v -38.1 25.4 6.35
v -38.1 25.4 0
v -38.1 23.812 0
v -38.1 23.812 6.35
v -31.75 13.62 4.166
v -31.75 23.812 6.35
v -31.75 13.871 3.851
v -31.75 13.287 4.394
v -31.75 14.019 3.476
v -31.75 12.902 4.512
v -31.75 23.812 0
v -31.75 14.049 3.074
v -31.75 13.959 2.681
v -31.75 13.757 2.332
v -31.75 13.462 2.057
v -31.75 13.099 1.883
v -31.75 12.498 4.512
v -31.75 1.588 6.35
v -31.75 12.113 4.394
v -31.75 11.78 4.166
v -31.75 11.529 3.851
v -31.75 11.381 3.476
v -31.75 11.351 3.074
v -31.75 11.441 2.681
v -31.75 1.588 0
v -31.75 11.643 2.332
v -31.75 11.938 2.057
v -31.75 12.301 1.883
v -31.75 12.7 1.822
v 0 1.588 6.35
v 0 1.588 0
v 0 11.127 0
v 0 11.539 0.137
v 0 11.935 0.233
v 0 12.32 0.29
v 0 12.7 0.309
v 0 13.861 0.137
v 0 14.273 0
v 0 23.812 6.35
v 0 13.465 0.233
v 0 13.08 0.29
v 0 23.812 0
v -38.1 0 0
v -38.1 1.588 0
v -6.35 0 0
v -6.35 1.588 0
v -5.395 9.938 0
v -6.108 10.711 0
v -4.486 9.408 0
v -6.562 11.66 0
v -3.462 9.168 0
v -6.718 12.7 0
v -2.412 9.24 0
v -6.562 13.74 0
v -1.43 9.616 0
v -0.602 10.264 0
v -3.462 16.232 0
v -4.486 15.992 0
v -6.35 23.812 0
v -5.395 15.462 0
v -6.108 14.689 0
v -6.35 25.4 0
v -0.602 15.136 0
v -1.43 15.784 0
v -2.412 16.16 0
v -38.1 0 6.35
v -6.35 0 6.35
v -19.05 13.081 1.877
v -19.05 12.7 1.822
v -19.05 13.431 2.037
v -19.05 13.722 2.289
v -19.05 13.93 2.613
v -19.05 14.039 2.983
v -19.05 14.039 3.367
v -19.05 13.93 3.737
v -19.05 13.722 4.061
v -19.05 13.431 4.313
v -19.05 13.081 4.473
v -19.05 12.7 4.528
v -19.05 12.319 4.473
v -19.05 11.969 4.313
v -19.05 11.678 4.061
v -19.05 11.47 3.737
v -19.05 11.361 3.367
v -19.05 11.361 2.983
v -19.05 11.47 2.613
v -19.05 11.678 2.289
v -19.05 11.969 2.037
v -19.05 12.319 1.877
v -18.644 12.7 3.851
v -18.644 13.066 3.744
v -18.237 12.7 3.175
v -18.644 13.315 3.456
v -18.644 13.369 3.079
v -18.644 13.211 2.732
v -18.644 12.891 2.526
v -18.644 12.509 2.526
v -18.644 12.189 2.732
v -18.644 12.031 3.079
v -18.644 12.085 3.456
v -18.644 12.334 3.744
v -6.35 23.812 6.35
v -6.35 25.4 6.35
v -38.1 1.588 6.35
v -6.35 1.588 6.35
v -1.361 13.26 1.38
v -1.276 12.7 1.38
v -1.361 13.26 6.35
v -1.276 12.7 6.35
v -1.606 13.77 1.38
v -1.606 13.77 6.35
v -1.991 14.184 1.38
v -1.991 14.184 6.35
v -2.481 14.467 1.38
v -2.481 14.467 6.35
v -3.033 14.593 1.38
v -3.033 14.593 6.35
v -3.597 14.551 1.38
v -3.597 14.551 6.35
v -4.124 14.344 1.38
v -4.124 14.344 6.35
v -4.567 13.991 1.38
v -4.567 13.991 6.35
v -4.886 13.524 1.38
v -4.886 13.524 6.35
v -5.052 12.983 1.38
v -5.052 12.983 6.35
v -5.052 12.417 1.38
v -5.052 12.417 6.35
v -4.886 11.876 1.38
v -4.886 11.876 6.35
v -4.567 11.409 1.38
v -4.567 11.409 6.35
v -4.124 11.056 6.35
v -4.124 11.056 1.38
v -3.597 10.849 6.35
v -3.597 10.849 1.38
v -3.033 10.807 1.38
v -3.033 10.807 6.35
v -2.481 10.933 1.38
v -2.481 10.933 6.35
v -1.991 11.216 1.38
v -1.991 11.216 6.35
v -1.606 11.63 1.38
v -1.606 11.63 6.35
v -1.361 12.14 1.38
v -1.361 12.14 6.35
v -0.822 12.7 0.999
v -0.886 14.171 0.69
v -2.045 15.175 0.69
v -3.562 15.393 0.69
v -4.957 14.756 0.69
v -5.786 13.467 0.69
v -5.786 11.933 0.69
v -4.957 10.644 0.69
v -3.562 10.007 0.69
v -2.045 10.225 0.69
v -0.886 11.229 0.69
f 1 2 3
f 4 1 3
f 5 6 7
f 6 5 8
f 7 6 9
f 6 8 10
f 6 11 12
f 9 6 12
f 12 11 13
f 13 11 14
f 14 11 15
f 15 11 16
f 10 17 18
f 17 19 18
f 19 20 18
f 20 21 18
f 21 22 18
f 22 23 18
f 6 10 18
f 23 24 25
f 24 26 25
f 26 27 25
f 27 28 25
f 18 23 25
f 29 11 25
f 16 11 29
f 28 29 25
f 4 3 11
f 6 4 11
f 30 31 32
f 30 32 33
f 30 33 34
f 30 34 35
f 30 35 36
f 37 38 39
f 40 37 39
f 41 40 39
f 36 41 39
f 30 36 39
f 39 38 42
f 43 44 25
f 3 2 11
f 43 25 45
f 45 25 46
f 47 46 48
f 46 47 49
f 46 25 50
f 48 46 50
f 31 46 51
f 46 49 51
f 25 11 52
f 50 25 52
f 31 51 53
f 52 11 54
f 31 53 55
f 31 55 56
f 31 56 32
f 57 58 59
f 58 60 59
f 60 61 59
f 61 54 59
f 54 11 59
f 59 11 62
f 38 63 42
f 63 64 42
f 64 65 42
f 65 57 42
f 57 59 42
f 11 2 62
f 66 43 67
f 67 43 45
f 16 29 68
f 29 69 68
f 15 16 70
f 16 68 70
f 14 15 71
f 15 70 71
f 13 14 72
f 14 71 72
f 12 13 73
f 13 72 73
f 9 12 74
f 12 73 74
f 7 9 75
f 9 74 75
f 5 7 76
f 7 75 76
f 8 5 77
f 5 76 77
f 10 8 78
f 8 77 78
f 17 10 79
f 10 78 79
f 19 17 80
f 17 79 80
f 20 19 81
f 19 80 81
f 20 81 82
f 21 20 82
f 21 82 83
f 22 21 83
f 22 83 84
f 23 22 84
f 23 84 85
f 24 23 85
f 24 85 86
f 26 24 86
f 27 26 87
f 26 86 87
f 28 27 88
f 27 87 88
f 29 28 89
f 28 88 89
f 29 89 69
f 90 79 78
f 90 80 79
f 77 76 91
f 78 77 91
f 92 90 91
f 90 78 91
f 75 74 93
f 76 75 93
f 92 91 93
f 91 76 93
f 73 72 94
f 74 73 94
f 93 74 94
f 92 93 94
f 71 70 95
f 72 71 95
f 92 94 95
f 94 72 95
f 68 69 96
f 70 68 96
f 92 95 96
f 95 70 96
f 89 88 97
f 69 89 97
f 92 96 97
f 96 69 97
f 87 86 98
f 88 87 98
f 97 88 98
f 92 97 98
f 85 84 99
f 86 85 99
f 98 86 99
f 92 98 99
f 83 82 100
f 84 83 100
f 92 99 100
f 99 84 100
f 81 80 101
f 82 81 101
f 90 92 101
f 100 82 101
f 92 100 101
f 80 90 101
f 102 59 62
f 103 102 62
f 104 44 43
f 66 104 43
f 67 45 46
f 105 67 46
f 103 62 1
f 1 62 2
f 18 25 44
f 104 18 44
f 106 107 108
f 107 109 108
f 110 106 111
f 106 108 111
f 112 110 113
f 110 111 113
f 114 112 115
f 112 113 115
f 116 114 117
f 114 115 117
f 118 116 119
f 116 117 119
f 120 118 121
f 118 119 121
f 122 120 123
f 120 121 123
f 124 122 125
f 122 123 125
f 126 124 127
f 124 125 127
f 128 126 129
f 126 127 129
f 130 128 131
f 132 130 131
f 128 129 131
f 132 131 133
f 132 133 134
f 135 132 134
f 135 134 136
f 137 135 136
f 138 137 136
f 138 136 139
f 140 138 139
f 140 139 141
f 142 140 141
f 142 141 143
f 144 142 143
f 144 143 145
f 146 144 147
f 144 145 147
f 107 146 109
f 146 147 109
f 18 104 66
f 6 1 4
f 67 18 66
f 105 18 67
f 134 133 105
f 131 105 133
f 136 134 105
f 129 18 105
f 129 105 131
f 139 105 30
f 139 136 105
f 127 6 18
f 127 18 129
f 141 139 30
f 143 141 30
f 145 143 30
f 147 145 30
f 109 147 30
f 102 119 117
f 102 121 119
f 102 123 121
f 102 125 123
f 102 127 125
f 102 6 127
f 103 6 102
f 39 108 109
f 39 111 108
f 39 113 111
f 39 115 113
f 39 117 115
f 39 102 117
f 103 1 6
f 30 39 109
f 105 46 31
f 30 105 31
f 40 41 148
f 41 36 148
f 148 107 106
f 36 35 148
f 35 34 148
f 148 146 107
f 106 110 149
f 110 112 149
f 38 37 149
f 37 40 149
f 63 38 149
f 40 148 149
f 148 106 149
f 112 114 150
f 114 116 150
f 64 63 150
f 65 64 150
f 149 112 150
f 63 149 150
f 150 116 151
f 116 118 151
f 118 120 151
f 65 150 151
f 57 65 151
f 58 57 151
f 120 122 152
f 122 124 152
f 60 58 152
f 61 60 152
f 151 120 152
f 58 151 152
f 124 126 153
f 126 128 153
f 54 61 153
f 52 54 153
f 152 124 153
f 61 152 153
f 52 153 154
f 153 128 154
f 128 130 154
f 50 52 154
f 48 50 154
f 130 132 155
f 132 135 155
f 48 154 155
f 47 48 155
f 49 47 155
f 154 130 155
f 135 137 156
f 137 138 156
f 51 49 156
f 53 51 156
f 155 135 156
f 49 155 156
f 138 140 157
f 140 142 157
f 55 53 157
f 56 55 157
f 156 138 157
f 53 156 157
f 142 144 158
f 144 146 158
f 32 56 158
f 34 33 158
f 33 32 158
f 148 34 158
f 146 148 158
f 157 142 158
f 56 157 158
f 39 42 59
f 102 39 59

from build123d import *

# Parameters (mm, degrees)
BOSS_EXTRUDE1_DEPTH                               = 6.35
TAP_DRILL_FOR_6_32_TAP1_D                         = 2.7051
TAP_DRILL_FOR_6_32_TAP1_DEPTH                     = 12.7
TAP_DRILL_FOR_6_32_TAP1_TIP                       = 0.81269403
CSK_FOR_6_FLAT_HEAD_MACHINE_SCREW_100_D           = 3.7973
CSK_FOR_6_FLAT_HEAD_MACHINE_SCREW_100_CSINK_D     = 7.0866
CSK_FOR_6_FLAT_HEAD_MACHINE_SCREW_100_CSINK_ANGLE = 100


with BuildPart() as part:
    # Sketch1 → Boss-Extrude1 (new body)
    with BuildSketch(Plane.XY):
        Polygon((0, 23.8125), (-6.35, 23.8125), (-6.35, 25.4), (-38.1, 25.4), (-38.1, 23.8125), (-31.75, 23.8125), (-31.75, 1.5875), (-38.1, 1.5875), (-38.1, 0), (-6.35, 0), (-6.35, 1.5875), (0, 1.5875), align=None)
    extrude(amount=BOSS_EXTRUDE1_DEPTH)

    # Tap Drill for #6-32 Tap1
    with Locations(Plane.ZY.offset(31.75)):
        with Locations((3.175, 12.7)):
            Hole(TAP_DRILL_FOR_6_32_TAP1_D / 2, depth=TAP_DRILL_FOR_6_32_TAP1_DEPTH)
            with Locations((0, 0, -(TAP_DRILL_FOR_6_32_TAP1_DEPTH + TAP_DRILL_FOR_6_32_TAP1_TIP / 2))):  # 118° drill point
                Cone(0, TAP_DRILL_FOR_6_32_TAP1_D / 2, TAP_DRILL_FOR_6_32_TAP1_TIP, mode=Mode.SUBTRACT)

    # CSK for #6 Flat Head Machine Screw (100)1 (through all)
    with Locations(Plane(origin=(0, 0, 0), x_dir=(-1, 0, 0), z_dir=(0, 0, -1))):
        with Locations((3.175, 12.7)):
            CounterSinkHole(CSK_FOR_6_FLAT_HEAD_MACHINE_SCREW_100_D / 2, CSK_FOR_6_FLAT_HEAD_MACHINE_SCREW_100_CSINK_D / 2, counter_sink_angle=CSK_FOR_6_FLAT_HEAD_MACHINE_SCREW_100_CSINK_ANGLE)


solid = part.part
